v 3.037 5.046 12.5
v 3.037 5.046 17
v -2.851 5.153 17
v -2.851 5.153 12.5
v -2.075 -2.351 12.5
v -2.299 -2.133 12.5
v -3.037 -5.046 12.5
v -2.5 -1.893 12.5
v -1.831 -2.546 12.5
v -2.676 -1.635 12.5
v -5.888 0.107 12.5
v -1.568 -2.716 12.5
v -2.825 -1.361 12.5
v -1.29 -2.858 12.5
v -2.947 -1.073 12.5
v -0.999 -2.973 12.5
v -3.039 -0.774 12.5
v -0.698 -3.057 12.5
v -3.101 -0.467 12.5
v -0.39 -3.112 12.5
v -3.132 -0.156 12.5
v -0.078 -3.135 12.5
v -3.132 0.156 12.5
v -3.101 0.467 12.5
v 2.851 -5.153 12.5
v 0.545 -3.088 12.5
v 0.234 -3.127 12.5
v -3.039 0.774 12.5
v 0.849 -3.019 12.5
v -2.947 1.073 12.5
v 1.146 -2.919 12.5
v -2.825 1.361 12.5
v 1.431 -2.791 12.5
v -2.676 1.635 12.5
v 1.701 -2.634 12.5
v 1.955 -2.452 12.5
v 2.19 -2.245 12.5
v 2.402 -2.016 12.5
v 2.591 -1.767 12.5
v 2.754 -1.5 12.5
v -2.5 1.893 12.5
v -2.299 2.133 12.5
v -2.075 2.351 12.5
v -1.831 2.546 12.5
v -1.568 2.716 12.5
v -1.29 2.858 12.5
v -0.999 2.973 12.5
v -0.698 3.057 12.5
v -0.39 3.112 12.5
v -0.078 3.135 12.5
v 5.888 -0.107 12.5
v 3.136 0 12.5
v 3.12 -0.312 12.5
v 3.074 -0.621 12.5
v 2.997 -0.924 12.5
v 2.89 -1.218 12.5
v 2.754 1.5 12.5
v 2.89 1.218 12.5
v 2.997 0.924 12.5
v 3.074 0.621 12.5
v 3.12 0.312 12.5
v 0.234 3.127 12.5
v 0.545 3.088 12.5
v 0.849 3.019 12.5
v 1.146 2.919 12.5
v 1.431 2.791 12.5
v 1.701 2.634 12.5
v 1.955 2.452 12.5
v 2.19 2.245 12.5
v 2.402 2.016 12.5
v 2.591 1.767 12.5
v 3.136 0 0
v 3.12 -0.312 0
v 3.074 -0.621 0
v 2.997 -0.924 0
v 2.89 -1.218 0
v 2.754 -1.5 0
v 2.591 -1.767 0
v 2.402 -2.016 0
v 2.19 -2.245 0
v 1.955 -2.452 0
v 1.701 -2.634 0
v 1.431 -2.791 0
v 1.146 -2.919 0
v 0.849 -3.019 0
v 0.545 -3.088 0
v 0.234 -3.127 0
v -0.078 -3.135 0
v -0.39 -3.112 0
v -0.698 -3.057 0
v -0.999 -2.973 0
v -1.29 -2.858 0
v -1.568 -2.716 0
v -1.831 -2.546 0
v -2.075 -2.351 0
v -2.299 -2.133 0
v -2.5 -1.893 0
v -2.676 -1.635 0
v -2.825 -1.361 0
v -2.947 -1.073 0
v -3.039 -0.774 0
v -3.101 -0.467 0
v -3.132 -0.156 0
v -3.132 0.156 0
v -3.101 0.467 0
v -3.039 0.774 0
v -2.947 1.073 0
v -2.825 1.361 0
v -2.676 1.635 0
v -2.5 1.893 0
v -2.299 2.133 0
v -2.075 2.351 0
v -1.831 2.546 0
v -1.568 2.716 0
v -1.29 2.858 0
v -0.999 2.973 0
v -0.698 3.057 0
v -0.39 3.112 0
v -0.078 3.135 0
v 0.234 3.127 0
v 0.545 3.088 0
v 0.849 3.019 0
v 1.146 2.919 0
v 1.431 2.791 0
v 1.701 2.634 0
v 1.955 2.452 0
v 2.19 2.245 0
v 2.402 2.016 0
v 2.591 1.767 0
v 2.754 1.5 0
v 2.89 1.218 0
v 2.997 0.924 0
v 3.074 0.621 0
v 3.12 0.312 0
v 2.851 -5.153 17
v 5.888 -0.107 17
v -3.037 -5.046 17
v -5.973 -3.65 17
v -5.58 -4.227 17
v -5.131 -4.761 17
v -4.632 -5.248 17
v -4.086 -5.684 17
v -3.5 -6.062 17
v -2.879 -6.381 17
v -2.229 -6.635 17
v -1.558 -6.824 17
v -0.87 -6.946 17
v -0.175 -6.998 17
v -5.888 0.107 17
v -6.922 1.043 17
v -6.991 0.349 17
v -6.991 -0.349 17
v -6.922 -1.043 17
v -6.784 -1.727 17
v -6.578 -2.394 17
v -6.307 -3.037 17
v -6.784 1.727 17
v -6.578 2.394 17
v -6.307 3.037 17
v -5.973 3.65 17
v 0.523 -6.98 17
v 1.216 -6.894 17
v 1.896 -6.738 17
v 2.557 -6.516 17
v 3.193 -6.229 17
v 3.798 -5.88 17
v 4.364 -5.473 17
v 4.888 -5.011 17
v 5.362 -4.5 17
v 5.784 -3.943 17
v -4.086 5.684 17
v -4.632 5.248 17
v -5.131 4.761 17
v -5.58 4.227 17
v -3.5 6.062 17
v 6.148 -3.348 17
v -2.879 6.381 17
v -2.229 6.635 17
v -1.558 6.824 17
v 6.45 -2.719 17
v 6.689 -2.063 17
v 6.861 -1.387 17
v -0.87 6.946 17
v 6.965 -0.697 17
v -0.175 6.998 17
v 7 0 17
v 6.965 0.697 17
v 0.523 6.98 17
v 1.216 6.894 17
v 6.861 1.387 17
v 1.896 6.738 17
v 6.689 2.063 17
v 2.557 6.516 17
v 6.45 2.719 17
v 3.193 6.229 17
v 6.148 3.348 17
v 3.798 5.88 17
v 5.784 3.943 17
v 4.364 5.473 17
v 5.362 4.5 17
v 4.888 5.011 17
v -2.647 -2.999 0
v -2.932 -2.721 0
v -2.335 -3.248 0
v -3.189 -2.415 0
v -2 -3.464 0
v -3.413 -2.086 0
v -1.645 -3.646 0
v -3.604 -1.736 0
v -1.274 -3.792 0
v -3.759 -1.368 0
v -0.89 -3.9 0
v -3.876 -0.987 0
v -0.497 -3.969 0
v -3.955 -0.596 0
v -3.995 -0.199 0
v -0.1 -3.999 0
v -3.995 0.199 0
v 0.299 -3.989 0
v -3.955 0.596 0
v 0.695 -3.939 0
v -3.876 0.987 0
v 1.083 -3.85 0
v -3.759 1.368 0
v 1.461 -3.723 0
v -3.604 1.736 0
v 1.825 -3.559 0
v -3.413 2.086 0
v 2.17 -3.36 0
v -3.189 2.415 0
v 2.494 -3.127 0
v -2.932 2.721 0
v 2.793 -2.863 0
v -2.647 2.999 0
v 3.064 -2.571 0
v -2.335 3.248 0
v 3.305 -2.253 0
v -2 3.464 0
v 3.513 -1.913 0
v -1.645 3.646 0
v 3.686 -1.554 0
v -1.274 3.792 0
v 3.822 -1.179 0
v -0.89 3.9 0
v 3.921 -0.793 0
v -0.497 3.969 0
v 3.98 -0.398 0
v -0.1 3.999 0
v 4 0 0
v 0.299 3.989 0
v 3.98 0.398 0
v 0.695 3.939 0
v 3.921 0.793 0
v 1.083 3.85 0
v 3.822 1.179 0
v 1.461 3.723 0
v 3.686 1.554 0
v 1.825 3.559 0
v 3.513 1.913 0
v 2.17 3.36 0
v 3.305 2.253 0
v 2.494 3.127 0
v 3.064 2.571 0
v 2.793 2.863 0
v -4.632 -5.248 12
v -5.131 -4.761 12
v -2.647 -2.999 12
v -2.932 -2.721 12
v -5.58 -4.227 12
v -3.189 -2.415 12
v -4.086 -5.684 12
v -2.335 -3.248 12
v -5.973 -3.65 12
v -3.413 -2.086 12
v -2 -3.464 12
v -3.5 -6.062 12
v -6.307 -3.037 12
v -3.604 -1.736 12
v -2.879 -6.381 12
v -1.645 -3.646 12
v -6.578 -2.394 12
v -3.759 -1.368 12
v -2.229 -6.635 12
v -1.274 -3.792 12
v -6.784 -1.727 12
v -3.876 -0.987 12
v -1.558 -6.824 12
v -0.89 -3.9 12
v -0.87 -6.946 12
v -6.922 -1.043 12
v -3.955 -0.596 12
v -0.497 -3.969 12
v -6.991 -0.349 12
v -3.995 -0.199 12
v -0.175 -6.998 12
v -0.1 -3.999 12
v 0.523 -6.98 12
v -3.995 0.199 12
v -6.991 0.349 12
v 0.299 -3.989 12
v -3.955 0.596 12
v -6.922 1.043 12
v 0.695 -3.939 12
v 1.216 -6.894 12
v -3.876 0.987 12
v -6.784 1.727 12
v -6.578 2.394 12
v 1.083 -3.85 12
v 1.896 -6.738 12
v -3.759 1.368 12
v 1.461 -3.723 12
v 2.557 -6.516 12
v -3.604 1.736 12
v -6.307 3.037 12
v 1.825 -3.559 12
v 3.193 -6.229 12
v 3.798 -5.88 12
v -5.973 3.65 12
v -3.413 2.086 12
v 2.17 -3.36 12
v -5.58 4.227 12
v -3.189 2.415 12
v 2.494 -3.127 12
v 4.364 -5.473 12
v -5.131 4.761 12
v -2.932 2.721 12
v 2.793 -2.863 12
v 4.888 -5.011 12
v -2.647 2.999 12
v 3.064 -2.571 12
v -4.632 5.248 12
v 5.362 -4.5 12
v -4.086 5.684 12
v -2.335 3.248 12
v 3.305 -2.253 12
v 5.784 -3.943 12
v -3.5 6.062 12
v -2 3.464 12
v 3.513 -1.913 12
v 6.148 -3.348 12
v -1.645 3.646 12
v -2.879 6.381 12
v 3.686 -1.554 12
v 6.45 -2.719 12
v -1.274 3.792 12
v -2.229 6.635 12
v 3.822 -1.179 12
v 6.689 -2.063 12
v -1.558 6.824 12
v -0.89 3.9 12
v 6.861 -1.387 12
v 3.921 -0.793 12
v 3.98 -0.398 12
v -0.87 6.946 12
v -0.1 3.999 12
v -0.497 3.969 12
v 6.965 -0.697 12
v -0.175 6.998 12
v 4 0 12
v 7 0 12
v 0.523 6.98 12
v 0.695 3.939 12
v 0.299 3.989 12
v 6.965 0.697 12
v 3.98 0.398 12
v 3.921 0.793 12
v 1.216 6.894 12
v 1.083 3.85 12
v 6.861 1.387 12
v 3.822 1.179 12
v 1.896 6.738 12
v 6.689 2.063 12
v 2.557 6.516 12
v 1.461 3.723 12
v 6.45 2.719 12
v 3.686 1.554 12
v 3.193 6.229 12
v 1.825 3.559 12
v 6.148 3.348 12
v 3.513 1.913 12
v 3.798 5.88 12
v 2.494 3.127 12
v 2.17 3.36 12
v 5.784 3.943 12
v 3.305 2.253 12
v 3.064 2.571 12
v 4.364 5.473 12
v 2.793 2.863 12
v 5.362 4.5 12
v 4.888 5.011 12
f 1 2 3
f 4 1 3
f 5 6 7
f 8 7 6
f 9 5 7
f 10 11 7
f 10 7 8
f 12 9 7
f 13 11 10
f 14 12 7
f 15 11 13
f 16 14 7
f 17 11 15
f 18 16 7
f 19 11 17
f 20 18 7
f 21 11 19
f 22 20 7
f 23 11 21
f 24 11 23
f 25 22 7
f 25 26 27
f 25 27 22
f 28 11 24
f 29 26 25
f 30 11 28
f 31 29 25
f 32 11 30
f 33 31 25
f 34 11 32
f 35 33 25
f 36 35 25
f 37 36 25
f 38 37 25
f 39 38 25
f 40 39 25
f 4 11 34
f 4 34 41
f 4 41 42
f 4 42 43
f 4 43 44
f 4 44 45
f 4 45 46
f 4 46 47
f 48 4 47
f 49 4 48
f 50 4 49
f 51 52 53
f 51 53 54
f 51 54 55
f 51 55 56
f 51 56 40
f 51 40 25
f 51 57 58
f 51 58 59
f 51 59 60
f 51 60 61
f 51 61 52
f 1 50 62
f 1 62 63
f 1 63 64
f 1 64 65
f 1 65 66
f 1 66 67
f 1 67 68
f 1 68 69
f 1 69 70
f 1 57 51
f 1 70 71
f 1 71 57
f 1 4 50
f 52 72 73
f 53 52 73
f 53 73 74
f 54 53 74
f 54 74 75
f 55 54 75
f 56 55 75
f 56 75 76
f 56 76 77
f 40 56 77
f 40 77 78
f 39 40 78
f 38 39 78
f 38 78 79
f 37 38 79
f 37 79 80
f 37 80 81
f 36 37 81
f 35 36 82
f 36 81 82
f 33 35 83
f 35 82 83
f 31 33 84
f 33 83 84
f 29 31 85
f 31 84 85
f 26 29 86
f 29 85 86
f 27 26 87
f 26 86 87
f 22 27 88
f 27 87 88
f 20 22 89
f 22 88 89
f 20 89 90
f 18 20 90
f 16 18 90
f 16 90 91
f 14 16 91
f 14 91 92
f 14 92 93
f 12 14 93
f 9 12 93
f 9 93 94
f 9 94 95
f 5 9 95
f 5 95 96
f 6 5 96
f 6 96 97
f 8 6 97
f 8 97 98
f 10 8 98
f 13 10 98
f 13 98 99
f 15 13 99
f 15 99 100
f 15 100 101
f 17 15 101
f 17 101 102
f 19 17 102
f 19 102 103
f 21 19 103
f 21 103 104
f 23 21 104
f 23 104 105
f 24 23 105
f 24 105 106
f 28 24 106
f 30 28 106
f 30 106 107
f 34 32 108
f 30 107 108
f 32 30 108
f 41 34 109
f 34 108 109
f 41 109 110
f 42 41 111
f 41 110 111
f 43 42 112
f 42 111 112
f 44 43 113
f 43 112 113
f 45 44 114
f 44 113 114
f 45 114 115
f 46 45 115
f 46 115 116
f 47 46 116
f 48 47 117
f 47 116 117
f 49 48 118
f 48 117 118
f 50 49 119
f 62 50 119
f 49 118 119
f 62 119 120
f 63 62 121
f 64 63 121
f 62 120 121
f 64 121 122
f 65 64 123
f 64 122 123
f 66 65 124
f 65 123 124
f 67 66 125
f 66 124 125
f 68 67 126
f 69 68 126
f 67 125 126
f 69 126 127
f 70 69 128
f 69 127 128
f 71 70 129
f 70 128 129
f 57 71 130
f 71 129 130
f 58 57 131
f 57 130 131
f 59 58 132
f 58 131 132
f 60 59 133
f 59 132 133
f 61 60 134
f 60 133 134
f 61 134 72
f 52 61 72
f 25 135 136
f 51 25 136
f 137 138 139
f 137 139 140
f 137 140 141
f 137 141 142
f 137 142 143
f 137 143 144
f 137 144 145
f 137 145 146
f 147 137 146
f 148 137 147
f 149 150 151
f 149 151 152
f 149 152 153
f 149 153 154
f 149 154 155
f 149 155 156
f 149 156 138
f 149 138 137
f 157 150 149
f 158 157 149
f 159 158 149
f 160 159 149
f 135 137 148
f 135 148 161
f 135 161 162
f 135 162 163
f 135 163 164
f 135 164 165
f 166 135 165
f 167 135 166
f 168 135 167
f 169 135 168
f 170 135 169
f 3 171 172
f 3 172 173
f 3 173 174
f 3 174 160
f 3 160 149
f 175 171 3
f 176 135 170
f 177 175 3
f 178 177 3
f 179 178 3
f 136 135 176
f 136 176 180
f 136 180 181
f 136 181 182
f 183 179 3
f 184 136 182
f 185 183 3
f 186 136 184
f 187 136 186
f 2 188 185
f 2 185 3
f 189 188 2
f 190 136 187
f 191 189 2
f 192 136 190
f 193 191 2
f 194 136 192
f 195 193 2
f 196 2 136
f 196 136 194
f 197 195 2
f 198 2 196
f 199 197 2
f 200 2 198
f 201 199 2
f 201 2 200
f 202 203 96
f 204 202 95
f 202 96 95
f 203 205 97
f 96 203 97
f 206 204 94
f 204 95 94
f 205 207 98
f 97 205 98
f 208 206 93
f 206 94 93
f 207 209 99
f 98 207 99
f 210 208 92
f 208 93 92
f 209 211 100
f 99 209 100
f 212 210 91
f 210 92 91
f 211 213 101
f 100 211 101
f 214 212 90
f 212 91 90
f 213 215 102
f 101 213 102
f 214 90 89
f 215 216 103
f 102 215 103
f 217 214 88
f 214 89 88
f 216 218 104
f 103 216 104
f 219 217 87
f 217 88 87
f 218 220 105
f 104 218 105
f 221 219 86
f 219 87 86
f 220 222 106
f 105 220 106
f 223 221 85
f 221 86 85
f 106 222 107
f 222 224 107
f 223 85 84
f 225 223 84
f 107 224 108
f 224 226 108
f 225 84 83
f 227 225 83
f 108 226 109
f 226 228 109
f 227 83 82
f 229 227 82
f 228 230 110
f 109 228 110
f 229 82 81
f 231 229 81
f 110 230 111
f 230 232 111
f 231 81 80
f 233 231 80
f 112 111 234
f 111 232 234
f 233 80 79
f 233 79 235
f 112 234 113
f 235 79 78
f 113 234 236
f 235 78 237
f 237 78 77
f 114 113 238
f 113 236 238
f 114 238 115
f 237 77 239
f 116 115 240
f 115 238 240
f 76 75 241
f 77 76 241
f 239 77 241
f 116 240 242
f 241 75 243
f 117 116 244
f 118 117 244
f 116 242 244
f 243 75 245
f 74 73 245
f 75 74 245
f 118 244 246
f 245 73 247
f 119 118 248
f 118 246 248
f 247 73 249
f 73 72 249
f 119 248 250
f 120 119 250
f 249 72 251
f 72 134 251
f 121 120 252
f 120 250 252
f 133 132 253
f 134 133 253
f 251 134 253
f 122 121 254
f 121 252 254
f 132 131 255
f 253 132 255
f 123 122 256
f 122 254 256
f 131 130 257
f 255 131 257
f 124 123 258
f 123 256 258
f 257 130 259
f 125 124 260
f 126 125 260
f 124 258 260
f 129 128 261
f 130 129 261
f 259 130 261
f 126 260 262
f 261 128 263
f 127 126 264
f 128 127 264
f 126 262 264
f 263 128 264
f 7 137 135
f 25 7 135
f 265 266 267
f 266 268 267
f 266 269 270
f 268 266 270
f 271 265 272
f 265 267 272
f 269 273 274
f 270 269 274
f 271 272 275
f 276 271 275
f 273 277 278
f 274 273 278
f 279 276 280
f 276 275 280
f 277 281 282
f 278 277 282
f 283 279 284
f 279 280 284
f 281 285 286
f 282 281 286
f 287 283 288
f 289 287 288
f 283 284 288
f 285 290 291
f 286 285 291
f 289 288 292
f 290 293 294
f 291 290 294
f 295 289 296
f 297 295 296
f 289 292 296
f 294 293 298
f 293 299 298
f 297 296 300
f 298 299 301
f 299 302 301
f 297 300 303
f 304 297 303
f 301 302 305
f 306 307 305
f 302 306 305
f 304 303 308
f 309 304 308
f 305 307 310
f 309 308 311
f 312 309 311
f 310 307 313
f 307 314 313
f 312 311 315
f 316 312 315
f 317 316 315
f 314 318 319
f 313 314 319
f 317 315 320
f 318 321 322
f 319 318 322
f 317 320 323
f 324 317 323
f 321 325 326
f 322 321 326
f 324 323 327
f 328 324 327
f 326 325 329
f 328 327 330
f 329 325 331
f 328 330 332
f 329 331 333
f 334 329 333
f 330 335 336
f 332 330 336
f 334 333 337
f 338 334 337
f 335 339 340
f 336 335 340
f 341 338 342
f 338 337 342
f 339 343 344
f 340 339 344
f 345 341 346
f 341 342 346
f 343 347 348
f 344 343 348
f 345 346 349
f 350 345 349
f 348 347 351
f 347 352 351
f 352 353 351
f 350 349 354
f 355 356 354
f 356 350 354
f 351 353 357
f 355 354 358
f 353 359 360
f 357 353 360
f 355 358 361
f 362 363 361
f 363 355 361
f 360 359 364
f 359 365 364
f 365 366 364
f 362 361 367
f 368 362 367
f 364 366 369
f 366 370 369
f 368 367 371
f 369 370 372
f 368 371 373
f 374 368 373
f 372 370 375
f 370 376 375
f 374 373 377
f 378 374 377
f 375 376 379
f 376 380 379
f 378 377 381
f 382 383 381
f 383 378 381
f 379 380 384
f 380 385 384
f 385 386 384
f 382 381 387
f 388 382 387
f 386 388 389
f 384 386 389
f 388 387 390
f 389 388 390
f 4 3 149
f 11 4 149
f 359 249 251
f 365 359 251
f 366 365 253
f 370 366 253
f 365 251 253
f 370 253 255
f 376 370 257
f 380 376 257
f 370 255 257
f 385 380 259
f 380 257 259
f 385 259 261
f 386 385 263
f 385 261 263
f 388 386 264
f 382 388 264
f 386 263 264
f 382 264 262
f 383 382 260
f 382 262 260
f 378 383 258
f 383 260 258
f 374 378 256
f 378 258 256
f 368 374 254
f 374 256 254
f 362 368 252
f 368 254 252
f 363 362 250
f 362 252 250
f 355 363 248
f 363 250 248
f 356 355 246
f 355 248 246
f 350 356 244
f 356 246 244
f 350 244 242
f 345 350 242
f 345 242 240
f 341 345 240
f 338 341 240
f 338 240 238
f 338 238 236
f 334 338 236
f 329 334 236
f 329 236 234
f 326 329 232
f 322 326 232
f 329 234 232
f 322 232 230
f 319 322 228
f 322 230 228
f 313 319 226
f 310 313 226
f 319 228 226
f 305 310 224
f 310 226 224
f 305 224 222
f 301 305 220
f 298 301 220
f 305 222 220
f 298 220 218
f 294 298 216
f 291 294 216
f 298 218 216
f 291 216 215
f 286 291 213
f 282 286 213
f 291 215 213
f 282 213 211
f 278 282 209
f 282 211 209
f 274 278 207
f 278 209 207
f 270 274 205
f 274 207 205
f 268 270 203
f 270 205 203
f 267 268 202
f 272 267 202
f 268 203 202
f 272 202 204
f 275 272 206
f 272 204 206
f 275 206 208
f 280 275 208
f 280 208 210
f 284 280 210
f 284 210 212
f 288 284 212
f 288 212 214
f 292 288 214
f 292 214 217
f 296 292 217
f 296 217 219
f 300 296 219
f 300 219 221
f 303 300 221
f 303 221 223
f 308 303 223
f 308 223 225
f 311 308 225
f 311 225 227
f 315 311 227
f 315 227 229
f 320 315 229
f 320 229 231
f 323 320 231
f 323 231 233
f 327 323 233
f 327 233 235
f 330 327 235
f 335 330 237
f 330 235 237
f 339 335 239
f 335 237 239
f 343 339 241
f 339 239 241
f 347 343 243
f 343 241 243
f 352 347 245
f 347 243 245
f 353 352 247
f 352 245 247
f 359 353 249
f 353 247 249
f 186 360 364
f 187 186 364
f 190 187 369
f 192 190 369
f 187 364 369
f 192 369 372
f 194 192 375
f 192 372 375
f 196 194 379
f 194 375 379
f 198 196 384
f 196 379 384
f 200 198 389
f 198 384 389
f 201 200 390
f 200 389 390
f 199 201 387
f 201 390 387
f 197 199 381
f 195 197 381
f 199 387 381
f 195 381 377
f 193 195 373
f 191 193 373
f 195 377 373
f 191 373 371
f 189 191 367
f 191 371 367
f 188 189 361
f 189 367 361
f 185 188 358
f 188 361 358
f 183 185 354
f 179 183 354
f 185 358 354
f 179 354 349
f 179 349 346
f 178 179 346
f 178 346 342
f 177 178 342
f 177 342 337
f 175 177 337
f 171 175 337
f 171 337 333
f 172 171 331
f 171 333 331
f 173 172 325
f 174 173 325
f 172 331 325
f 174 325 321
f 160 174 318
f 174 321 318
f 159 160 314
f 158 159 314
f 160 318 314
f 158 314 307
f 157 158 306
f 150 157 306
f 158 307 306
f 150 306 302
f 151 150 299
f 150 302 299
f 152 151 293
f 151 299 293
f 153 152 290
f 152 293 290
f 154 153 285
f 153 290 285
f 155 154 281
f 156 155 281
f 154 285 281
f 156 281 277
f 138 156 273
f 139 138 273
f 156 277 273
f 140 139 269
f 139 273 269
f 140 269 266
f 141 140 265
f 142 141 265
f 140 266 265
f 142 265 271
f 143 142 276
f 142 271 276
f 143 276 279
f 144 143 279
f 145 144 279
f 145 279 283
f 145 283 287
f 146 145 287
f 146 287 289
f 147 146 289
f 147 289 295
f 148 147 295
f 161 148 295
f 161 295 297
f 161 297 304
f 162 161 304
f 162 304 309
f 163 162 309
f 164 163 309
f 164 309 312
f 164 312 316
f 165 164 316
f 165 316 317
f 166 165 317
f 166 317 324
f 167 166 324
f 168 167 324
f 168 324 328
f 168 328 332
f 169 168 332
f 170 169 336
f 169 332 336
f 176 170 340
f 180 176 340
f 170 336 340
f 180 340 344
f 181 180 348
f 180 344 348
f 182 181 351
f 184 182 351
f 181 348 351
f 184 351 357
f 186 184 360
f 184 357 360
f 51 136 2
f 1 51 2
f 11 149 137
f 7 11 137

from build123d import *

# Parameters (mm, degrees)
F0_R     = 4
F1_DEPTH = 12
F2_R     = 7
F3_DEPTH = 5
F5_DEPTH = 4.5
F6_R     = 3.135896
F7_DEPTH = 25


with BuildPart() as f1:
    # F0 (on Top) → F1 (new body)
    with BuildSketch(Plane.XY):
        Circle(F0_R)
    extrude(amount=F1_DEPTH)

    # F2 (on face) → F3 (join)
    with BuildSketch(Plane.XY.offset(12)):
        Circle(F2_R)
    extrude(amount=F3_DEPTH)

    # F4 (on face) → F5 (cut)
    with BuildSketch(Plane.XY.offset(17)):
        Polygon((5.887997, -0.107183), (3.036822, 5.045564), (-2.851175, 5.152747), (-5.887997, 0.107183), (-3.036822, -5.045564), (2.851175, -5.152747), align=None)
    extrude(amount=-F5_DEPTH, mode=Mode.SUBTRACT)

    # F6 (on face) → F7 (cut)
    with BuildSketch(Plane(origin=(0, 0, 0), x_dir=(1, 0, 0), z_dir=(0, 0, -1))):
        Circle(F6_R)
    extrude(amount=-F7_DEPTH, mode=Mode.SUBTRACT)


solid = f1.part
